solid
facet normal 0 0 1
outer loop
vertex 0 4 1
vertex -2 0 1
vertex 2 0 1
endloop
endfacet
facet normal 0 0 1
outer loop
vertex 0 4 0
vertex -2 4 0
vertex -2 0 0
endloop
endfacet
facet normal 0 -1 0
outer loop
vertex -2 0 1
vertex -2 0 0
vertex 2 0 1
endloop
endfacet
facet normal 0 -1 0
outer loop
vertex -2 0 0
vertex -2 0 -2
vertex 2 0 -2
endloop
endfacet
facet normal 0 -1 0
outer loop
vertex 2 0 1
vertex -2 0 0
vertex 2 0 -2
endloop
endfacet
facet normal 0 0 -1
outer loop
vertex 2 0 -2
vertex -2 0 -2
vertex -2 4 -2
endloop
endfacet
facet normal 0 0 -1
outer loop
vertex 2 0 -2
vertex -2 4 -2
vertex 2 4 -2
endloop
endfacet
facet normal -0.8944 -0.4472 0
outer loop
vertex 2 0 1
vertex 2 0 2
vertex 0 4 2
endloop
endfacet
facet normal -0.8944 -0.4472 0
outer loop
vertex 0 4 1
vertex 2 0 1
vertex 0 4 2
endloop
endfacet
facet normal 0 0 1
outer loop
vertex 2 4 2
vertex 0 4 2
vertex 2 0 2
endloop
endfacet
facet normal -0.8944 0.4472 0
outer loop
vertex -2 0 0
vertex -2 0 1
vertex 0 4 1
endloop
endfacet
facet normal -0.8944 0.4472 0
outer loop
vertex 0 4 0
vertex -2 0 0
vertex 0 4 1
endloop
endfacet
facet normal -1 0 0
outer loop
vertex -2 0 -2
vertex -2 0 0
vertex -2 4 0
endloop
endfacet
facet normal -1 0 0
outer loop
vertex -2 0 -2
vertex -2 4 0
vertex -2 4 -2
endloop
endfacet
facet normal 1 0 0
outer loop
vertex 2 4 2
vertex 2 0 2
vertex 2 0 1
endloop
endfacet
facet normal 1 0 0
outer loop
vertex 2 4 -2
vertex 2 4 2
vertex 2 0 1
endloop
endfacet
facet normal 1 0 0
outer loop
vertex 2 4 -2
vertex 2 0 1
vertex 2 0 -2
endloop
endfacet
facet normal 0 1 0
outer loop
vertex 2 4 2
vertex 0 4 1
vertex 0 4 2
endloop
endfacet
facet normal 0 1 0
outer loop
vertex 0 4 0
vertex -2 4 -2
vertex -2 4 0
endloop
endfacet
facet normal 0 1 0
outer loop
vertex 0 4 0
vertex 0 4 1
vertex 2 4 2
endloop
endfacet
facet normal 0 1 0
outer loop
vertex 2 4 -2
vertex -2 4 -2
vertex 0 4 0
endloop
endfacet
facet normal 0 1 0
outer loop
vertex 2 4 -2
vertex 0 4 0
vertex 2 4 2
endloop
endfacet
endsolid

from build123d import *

# Parameters (mm, degrees)
SKETCH1_W           = 4
SKETCH1_H           = 4
BOSS_EXTRUDE1_DEPTH = 4
CUT_EXTRUDE3_DEPTH  = 2
CUT_EXTRUDE4_DEPTH  = 1


with BuildPart() as part:
    # Sketch1 → Boss-Extrude1 (new body)
    with BuildSketch(Plane(origin=(0, 0, 0), x_dir=(1, 0, 0), z_dir=(0, 1, 0))):
        Rectangle(SKETCH1_W, SKETCH1_H)
    extrude(amount=BOSS_EXTRUDE1_DEPTH)

    # Sketch6 → Cut-Extrude3 (cut)
    with BuildSketch(Plane.XY.offset(2)):
        Polygon((0, 4), (-2, 4), (-2, 0), align=None)
    extrude(amount=-CUT_EXTRUDE3_DEPTH, mode=Mode.SUBTRACT)

    # Sketch7 → Cut-Extrude4 (cut)
    with BuildSketch(Plane.XY.offset(2)):
        Polygon((0, 4), (-2, 0), (2, 0), align=None)
    extrude(amount=-CUT_EXTRUDE4_DEPTH, mode=Mode.SUBTRACT)


solid = part.part
